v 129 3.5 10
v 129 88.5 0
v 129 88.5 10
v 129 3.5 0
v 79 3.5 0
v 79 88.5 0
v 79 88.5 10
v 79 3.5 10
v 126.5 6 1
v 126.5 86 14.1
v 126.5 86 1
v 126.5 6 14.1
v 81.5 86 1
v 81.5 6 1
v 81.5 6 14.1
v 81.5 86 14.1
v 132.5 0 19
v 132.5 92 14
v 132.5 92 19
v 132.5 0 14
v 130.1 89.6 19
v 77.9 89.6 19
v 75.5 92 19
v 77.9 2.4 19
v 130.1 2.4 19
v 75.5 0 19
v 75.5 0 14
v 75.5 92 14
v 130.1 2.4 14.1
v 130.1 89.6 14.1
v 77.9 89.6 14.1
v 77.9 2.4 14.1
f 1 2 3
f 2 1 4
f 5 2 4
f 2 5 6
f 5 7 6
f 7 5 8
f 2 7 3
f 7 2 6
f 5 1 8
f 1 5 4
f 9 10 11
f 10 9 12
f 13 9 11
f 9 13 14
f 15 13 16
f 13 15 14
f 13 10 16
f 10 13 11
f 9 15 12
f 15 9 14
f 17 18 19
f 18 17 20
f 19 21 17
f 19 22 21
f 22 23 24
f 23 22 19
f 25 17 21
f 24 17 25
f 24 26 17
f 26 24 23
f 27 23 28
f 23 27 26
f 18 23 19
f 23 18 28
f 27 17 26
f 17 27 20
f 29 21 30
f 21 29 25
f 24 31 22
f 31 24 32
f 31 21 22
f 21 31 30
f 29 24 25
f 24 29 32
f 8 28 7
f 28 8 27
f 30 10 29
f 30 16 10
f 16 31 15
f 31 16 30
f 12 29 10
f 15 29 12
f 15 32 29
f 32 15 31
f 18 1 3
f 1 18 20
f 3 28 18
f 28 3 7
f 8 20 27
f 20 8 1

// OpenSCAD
// Display the Cover
display_cover = "no"; // [yes,no]
// Display the box
display_box = "yes"; // [yes,no]
// Create ears at the corner
with_antiwarp_ears = "no"; // [yes,no]


// the x length inside the box (the resulting x of the box is inner_x + 2*wall)
inner_x = 45;
// the y length inside the box
inner_y = 80;
// the z height inside the box, until the stacking frame begins
inner_z = 13;

// the z height of the stacking frame
stack_z = 5;
// per side gap between the box-bottom and the stacking frame (box bttom = inner_x + 2*wall; inner stackingframe x = inner_x + 2*wall + 2*stack_gap)
stack_gap = 1;

// wall thickness
wall = 2.5;
// bottom thickness
bottom = 1;

// start-height for overhang suport (should be >stack_z )
support_start_height = 10;

// height of the cover (the stacking part has the "stack_z"-height)
cover_height = 5;

// radius of the antiwarp ear
ear_radius = 10;
// height of the antiwarp ear, should be your layer-height for easy cutoff
ear_height = 0.2;


if(display_cover == "yes"){
	stackable_box_cover(inner_x,inner_y,stack_z,stack_gap,wall,cover_height);
	if(with_antiwarp_ears == "yes"){
		ears(0, 0, inner_x + wall*4 + stack_gap*2, inner_y + wall*4 + stack_gap*2);
	}
}


if(display_box == "yes"){
translate([inner_x + wall*4 + stack_gap*2 + ear_radius*2 + 2,wall + stack_gap,0]){
	stackable_box(inner_x,inner_y,inner_z,stack_z,stack_gap,wall,bottom,support_start_height);
	if(with_antiwarp_ears == "yes"){
		difference() {
			ears(0, 0, inner_x + wall*2, inner_y + wall*2);
			translate([wall,wall, 0]) 
				cube([inner_x, inner_y, inner_z*2]);
		}
	}
}
}


module stackable_box_cover(x, y,stack_z, gap, w,c) {
	cube([x + w*4 + gap*2, y + w*4 + gap*2, c]);
	translate([w+gap, w+gap, 0])
		cube([x + w*2, y + w*2, stack_z+c]);
}


module stackable_box(x, y, z,stack_z, gap, w, b, supheight, epsilon=0.1) {
	box(x, y, z, w, b);
	translate([-wall-gap , -wall-gap , z+b])
		box(x + wall*2 + gap*2 +2*epsilon, y + wall*2 + gap*2+2*epsilon, stack_z, w-epsilon, 0);

	difference() {
		hull() {
			translate([-wall-gap, -wall-gap, z+b]) 
				box(x + wall*2 + gap*2 +2*epsilon, y + wall*2 + gap*2 +2*epsilon, 0.1,  w-epsilon, 0);
			translate([0, 0, supheight]) 
				box(x, y, 0.1, w, b);
		}
		translate([w,w, 0]) 
			cube([x, y, z*2]);
	}


}

module box(x, y, z, w,b) {
	difference() {
		cube([(x + (2 * w)), (y + (2 * w)), (z + b)]);
		translate([w, w, b]) 
			cube([x, y, (z * 2)]);
	}
}

module ears(xmin, ymin, xmax, ymax, ear_radius, ear_height) {
	translate([xmin, ymin, 0]) cylinder(r = ear_radius, h = ear_height);
	translate([xmin, ymax, 0]) cylinder(r = ear_radius, h = ear_height);
	translate([xmax, ymin, 0]) cylinder(r = ear_radius, h = ear_height);
	translate([xmax, ymax, 0]) cylinder(r = ear_radius, h = ear_height);
}
